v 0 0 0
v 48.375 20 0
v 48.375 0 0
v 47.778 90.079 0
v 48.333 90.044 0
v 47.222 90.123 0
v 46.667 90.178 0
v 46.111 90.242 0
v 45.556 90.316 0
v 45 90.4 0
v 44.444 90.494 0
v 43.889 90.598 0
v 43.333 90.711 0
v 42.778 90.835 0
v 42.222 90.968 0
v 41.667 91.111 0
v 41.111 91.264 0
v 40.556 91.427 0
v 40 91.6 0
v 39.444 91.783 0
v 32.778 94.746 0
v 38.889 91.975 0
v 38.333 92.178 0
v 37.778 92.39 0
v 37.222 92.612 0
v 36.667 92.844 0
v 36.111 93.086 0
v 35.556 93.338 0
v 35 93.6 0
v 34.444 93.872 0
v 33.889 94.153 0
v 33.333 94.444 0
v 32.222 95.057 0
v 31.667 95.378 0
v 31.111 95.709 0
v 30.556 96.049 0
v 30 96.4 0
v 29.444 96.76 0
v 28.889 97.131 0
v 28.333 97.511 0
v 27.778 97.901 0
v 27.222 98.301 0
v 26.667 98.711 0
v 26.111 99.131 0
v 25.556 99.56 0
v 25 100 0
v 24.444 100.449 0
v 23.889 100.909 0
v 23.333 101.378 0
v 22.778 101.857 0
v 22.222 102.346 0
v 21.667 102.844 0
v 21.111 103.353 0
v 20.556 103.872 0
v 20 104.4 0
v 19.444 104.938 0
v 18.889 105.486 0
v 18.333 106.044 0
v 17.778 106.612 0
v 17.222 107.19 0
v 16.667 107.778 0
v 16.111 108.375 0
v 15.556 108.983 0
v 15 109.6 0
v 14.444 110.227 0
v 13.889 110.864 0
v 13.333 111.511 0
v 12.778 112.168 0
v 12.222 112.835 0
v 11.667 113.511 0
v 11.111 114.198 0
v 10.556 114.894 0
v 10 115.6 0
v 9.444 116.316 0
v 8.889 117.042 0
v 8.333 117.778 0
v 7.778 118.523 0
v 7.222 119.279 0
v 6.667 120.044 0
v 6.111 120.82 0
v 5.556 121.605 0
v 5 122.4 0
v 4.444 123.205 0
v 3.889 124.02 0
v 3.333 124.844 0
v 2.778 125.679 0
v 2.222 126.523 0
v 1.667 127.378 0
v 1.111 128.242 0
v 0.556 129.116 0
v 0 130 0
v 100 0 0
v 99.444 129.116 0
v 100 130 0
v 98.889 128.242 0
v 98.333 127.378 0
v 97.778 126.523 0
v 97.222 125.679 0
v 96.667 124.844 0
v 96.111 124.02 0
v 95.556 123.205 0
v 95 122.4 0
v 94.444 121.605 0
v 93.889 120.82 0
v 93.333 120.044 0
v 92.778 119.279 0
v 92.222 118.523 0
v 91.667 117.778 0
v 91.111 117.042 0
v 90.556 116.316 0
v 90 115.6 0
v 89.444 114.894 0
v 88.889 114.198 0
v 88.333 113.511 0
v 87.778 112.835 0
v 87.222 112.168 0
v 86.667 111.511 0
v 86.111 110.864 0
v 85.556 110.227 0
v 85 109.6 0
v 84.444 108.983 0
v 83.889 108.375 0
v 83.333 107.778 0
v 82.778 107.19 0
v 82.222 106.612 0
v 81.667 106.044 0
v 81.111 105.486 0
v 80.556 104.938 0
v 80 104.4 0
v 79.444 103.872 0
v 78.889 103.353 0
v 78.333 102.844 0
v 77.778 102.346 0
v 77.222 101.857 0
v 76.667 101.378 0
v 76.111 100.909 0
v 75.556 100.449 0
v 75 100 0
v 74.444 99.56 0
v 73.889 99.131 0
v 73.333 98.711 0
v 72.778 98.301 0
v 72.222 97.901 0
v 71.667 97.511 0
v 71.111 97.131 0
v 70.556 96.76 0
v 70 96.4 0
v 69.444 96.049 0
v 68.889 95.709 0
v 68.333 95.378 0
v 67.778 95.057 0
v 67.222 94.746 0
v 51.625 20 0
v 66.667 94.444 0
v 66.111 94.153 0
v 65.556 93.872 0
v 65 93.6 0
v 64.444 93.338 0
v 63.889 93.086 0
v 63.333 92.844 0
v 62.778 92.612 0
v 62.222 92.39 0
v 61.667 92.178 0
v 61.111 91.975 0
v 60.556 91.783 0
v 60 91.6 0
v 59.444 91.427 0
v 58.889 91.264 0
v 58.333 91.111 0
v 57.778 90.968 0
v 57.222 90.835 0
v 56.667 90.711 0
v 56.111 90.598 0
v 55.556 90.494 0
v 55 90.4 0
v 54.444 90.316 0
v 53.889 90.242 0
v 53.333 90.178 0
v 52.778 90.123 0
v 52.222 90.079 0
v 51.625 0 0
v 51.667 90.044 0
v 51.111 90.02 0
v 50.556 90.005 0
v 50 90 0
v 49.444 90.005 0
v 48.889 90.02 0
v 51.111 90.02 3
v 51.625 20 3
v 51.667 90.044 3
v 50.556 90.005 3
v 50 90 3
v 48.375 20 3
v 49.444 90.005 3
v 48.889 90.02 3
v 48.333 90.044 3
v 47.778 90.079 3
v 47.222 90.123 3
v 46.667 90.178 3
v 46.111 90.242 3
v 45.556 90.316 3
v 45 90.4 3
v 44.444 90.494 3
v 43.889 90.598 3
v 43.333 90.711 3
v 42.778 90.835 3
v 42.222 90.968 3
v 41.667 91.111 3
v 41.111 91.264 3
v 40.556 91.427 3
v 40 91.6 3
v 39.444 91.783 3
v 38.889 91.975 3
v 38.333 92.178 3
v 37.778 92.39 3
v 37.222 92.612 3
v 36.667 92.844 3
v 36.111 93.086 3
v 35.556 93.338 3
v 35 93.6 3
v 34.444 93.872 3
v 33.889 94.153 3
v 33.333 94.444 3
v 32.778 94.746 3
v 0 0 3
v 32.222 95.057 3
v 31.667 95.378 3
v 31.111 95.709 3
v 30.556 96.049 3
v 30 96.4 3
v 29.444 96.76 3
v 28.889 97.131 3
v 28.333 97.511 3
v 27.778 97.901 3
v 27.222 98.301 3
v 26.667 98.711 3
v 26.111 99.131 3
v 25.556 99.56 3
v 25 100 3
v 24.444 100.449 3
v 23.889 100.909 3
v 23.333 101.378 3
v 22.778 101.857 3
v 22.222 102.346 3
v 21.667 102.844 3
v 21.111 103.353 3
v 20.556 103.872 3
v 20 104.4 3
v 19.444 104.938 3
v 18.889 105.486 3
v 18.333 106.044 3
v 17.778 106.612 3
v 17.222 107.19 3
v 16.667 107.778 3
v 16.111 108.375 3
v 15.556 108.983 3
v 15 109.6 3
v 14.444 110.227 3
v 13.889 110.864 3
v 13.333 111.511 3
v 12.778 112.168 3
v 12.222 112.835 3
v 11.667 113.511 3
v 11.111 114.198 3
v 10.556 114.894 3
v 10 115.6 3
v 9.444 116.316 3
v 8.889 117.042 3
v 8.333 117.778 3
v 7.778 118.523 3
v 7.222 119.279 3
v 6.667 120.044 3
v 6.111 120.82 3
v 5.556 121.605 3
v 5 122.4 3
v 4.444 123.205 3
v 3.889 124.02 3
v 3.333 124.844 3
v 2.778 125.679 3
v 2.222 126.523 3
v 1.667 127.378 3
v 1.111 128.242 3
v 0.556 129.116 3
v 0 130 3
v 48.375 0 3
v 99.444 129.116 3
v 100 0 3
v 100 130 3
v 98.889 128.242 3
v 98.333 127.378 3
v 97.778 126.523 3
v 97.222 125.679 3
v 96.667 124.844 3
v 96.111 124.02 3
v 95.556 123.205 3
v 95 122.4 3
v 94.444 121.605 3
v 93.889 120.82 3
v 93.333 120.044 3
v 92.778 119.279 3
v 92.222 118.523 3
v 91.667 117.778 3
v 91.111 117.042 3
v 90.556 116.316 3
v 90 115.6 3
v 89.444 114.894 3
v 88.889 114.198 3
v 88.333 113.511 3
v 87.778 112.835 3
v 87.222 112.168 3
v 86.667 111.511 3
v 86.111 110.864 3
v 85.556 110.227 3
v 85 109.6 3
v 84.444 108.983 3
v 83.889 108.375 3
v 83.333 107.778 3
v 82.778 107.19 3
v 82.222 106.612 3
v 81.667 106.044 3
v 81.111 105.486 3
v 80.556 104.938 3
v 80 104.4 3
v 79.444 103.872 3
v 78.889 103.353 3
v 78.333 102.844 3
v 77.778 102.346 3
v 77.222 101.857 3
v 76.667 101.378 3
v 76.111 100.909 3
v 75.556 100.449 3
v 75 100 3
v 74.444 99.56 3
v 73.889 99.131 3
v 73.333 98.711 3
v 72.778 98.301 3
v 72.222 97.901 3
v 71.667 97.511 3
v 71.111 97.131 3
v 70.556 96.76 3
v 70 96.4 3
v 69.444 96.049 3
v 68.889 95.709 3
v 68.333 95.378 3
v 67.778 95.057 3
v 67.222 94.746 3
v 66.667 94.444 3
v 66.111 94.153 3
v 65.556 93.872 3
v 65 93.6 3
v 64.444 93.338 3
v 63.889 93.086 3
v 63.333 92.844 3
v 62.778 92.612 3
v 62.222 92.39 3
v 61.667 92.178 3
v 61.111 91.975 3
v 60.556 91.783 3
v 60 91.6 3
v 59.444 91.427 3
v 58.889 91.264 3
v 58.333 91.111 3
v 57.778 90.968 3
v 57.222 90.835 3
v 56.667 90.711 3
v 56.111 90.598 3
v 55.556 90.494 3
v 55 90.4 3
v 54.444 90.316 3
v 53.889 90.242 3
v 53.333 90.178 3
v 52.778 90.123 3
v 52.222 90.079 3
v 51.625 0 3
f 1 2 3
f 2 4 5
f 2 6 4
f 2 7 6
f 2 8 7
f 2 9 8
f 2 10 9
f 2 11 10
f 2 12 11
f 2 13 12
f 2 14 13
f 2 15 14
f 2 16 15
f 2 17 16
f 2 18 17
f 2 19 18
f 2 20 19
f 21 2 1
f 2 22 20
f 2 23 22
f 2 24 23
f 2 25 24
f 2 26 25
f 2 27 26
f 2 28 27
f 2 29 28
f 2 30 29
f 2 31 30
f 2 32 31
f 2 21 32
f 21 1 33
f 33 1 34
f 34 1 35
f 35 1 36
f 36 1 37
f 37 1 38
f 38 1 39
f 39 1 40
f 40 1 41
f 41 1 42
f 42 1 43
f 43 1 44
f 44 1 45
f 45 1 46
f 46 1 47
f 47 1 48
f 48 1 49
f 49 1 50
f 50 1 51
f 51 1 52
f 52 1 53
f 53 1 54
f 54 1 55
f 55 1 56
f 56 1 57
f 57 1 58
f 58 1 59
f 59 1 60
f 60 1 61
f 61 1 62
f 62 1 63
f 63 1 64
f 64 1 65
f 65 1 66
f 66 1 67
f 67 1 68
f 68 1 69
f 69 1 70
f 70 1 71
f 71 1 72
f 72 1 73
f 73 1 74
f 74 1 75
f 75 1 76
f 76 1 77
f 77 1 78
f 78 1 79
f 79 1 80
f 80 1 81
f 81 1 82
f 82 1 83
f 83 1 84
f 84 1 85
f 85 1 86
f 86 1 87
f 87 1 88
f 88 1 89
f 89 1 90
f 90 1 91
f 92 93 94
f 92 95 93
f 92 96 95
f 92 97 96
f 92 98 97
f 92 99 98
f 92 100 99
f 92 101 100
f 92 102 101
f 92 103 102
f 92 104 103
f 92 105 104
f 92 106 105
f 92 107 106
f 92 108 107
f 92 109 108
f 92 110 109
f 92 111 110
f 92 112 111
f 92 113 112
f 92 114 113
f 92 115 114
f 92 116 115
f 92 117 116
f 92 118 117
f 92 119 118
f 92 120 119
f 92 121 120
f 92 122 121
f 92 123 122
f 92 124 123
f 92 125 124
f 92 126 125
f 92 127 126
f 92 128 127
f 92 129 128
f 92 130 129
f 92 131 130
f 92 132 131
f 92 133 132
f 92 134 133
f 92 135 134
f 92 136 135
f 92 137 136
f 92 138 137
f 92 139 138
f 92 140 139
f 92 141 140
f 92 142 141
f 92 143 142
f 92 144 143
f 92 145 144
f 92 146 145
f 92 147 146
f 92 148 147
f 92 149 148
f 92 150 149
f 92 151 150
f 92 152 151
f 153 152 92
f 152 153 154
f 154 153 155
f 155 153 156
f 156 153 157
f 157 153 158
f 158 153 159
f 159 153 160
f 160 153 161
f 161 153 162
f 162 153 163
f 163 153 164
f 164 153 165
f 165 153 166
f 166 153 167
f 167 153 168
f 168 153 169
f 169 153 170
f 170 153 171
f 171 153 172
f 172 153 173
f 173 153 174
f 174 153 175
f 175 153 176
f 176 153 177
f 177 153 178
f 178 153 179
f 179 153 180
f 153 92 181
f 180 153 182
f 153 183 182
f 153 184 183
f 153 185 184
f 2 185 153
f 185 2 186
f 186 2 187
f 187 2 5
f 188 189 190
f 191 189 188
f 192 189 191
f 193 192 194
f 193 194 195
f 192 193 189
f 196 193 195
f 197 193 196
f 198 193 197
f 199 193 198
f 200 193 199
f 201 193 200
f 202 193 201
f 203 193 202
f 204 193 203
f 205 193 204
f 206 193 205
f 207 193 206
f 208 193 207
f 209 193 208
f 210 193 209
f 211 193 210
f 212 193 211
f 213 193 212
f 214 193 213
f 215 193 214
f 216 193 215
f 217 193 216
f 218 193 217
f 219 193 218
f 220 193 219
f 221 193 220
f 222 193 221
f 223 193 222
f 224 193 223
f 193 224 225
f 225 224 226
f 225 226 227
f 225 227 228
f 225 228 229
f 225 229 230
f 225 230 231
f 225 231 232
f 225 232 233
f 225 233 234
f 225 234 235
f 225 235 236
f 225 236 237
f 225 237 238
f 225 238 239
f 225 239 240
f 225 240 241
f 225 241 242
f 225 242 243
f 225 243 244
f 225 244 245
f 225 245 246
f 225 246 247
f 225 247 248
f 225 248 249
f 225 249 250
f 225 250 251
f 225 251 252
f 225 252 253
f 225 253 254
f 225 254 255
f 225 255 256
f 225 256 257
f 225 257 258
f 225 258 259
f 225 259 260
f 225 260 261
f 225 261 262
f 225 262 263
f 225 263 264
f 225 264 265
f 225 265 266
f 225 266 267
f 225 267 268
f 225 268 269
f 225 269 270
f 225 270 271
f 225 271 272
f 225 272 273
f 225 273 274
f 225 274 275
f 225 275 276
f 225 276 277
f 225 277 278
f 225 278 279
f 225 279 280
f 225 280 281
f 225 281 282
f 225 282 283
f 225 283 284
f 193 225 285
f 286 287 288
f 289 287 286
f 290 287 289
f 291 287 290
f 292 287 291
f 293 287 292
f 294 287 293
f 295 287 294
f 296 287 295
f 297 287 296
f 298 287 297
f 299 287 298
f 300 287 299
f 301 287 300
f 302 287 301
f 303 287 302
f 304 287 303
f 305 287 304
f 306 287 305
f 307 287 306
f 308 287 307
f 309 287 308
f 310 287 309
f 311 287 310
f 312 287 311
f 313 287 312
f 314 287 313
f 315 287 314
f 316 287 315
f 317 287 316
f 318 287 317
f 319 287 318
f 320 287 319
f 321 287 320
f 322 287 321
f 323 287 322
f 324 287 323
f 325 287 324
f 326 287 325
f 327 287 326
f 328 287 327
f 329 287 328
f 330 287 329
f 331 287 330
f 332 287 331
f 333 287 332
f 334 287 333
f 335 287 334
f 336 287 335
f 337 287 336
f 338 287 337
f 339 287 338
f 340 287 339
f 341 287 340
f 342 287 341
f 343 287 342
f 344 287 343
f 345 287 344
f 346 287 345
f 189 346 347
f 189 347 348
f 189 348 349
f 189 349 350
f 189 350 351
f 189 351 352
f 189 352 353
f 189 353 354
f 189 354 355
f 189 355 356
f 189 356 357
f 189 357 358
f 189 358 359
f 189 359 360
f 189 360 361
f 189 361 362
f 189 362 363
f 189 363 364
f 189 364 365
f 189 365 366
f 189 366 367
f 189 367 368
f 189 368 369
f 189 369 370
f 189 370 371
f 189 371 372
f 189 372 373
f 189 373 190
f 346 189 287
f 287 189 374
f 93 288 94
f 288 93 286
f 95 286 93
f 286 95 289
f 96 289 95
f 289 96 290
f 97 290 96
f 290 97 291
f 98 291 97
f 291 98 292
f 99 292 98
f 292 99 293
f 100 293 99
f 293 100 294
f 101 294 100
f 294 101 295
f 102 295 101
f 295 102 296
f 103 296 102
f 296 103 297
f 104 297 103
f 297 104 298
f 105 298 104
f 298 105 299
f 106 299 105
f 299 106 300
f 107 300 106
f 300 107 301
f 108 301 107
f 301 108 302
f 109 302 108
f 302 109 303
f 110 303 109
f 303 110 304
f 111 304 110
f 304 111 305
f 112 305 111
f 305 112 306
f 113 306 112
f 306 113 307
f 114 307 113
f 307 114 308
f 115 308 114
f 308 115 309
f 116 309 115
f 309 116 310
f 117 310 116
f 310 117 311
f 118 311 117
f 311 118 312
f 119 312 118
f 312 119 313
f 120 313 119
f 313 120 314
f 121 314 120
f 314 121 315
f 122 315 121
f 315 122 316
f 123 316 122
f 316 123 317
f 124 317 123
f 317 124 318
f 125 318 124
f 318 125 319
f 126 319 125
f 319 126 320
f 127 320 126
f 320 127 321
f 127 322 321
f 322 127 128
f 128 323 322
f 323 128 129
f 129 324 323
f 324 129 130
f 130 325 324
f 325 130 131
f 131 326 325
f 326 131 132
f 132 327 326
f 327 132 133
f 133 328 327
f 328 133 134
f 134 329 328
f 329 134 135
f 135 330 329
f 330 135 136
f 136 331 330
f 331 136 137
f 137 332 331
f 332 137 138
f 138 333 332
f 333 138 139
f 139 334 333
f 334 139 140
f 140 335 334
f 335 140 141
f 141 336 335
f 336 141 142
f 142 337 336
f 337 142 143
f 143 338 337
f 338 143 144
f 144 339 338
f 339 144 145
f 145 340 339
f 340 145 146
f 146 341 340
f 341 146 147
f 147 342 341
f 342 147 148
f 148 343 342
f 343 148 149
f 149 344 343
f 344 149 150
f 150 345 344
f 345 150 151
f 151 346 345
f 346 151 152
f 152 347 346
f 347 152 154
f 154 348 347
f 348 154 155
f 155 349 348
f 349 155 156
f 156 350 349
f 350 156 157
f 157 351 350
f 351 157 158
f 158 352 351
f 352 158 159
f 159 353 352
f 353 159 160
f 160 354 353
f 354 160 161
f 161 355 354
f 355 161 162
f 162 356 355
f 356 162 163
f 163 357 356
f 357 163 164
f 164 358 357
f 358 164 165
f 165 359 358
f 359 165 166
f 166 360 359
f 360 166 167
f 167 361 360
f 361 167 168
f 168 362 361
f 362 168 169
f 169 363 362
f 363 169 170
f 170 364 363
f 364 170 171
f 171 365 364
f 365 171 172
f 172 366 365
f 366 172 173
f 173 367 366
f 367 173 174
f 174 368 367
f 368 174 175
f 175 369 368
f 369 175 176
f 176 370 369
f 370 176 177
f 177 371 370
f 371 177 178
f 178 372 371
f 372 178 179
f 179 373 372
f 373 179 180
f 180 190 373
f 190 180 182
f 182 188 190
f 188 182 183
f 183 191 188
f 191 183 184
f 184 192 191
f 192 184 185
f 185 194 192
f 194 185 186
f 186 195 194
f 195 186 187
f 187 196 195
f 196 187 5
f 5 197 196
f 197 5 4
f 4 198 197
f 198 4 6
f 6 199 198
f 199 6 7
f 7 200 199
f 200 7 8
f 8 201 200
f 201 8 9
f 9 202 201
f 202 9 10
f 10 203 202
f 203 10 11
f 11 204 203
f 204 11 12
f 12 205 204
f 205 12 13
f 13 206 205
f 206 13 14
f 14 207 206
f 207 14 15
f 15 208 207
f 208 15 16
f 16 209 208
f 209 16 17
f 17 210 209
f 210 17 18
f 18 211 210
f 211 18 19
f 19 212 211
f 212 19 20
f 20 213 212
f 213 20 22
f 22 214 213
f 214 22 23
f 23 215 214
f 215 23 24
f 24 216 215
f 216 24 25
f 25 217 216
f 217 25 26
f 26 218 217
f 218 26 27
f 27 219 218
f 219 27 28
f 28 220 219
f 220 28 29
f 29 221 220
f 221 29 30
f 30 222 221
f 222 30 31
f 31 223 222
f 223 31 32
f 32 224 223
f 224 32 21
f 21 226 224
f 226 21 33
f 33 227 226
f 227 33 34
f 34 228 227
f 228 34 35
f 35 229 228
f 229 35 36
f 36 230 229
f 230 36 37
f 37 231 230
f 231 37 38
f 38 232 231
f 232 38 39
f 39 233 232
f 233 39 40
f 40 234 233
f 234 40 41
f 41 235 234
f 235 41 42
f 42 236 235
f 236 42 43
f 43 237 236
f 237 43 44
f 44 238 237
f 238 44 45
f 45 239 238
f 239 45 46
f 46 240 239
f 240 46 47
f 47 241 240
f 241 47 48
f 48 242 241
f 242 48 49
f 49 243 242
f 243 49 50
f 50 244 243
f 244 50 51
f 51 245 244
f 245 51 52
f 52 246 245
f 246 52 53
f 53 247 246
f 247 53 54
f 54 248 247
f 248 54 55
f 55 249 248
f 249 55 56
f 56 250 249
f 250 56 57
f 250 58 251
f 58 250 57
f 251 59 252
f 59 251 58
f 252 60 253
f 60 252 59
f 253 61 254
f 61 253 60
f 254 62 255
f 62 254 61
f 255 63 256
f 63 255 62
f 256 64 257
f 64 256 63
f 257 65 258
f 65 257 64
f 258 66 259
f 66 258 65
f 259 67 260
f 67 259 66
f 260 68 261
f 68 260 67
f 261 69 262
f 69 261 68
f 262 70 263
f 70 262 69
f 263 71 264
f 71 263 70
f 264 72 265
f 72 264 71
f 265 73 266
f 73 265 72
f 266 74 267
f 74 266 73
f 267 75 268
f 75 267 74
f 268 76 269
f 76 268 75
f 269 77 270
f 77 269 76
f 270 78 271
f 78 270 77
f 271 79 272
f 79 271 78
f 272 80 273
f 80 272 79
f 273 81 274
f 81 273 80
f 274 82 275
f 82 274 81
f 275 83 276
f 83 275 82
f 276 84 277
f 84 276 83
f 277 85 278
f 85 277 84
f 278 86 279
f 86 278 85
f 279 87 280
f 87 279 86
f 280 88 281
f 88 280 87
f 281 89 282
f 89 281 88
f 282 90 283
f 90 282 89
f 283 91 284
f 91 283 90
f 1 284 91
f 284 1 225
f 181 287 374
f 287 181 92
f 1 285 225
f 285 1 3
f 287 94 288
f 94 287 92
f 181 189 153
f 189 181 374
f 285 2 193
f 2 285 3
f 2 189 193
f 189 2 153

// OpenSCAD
///////////////////////////////////////////////////////////////
// TRACE SLICES + STAND (single-file workflow)
// Updated per request:
//  - Slice has TWO bottom slots at 1/4 and 3/4 along length
//  - Slice and stand have SAME thickness = slice_thickness
//  - Slot opening width (mating) = slice_thickness + clearance
///////////////////////////////////////////////////////////////

//////////////////// USER PARAMETERS //////////////////////////

///////////////////////////////////////////////////////////////
MODE = "slice";          // "slice" | "stand"

//////
// Function definition and parameters
//////
function f(x,y) = x*x - y*y+5;
// Domain: [xmin,xmin+x_span] x [ymin,ymin+y_span]
xmin       = -2;         // math x-min
ymin       = -2;         // math y-min
x_span     = 4;          // math width in x-direction
y_span     = 4;          // math width in y-direction
n_samples  = 180;        // curve sampling resolution

//////
// Slice parameters
//////
slice_axis = "y";        // "x" => x=constant slices
                         // "y" => y=constant slices
numslices  = 7;          // number of traces
k          = 4;          // slice number to generate: 1...numslices
slice_thickness = 3.0;   // mm 
clearance       = 0.25;  // mm — fit tolerance

//////
// Size parameters
//////
// Physical size of the final object
x_length   = 100;        // mm
y_length   = 100;        // mm

// Vertical scaling/offset: z_mm = z_offset + z_scale * f(x,y)
z_scale    = 10;         // mm per math-unit
z_offset   = 40;         // mm
z_floor    = 0;          // mm (clamp below)

//////
// Slot parameters
//////
// Slots are located as described. For instance, slot_positions = [0.25, 0.75] would yield slots at 1/4 and 3/4 of the slice length.
slot_h     = 20;          // mm — height of the slice notch
slot_positions = [0.5];

// Slot opening (in the mating direction) = slice thickness + clearance
slot_opening_w = slice_thickness + clearance;

//////
// Stand parameters
//////
// Height is 2*slot_h; slots cut down from the top by slot_h.
stand_height  = 2*slot_h;
stand_margin  = 6;                 // mm extra length beyond the slice length on both ends
stand_N       = numslices;         // positions


///////////////////////////////////////////////////////////////
// Helpers
function lerp(a,b,t) = a + (b-a)*t;
function clamp(v, lo, hi) = (v<lo)?lo : (v>hi)?hi : v;

// Length of the generated slice in mm (depends on which axis varies).
function slice_length_mm() = (slice_axis=="x") ? y_length : x_length;

// Map y_mm in [0,y_length] to y_math in [ymin, ymin+y_span]
function y_math_from_mm(y_mm) = lerp(ymin, ymin + y_span, y_mm/y_length);

// Map x_mm in [0,x_length] to x_math in [xmin, xmin+x_span]
function x_math_from_mm(x_mm) = lerp(xmin, xmin + x_span, x_mm/x_length);

// Evenly spaced x_k in [xmin, xmin+x_span]
function xk_from_k(k_) =
    (numslices<=1) ? xmin :
    lerp(xmin, xmin + x_span, (k_-1)/(numslices-1));

// Evenly spaced y_k in [ymin, ymin+y_span]
function yk_from_k(k_) =
    (numslices<=1) ? ymin :
    lerp(ymin, ymin + y_span, (k_-1)/(numslices-1));

// Convert f(x,y) to printable z(mm), clamped
function z_mm(xm, ym) = max(z_floor, z_offset + z_scale * f(xm, ym));

// Backwards-compatible list reverse (also fine on new versions)
function reverse_list(v) = [ for (i = [len(v)-1 : -1 : 0]) v[i] ];

///////////////////////////////////////////////////////////////
// Slice: 2D outline in (Y,Z), extruded in X by slice_thickness
module slice2D_outline(k_=k) {
    xk = xk_from_k(k_);
    yk = yk_from_k(k_);
    slice_len = slice_length_mm();

    top = [
        for (i=[0:n_samples])
            let(s_mm = slice_len * i / n_samples,
                xm   = x_math_from_mm(s_mm),
                ym   = y_math_from_mm(s_mm),
                z    = (slice_axis=="x") ? z_mm(xk, ym) : z_mm(xm, yk))
            [s_mm, z]
    ];

    bottom_left  = [0, 0];
    bottom_right = [slice_len, 0];

    polygon(points = concat([bottom_left, bottom_right], reverse_list(top)));
}

module slice3D(k_=k) {
    // Some parameter combos clamp the profile to z_floor before reaching the slice end.
    // If we place a slot beyond the last nonzero profile point, it won't appear.
    // So compute an effective length for slot placement based on the sampled curve.
    xk = xk_from_k(k_);
    yk = yk_from_k(k_);
    slice_len = slice_length_mm();
    eps = 0.001;
    nonzero_idx = [
        for (i=[0:n_samples])
            let(s_mm = slice_len * i / n_samples,
                xm   = x_math_from_mm(s_mm),
                ym   = y_math_from_mm(s_mm),
                z    = (slice_axis=="x") ? z_mm(xk, ym) : z_mm(xm, yk))
            if (z > z_floor + eps) i
    ];
    slot_ref_len = (len(nonzero_idx) == 0) ? slice_len : (slice_len * max(nonzero_idx) / n_samples);

    difference() {
        linear_extrude(height = slice_thickness, center=false, convexity=10)
            slice2D_outline(k_);

        // Two bottom slots (notches): opening width = slot_opening_w,
        // height = slot_h, centered at 1/4 and 3/4 of the length.
        for (p = slot_positions) {
            // In this model, the slice outline is in the XY plane:
            //   X = along the slice length (0..slice_len)
            //   Y = vertical height (0..z)
            // and the slice thickness is extruded along Z.
            // So the notch should be positioned along X, rise in Y, and cut through Z.
            translate([ p*slot_ref_len - slot_opening_w/2, -1, -1 ]) // -1 ensures full cut
                cube([ slot_opening_w, slot_h + 1, slice_thickness + 2 ], center=false);
        }
    }
}

///////////////////////////////////////////////////////////////
// Stand: same thickness as slice (slice_thickness)
// Stand is a solid block with slots removed (i.e., the inverse of the old key comb).
module stand3D() {
    stand_len = slice_length_mm() + 2*stand_margin;

    // Position centers along Y
    function posY(i) =
        (stand_N<=1) ? (stand_len/2) :
        stand_margin + (stand_len - 2*stand_margin) * (i/(stand_N-1));

    module stand_upright() {
        // Shift so the central usable span corresponds to y in [0, slice_length_mm()].
        translate([0, -stand_margin, 0])
            difference() {
                // Base block spans y in [-stand_margin, slice_length_mm()+stand_margin].
                cube([ slice_thickness, stand_len, stand_height ], center=false);

                // Slots: cut down from the top by slot_h.
                // Slot opening (mating) = slot_opening_w.
                for (i=[0:stand_N-1]) {
                    yc = posY(i);
                    translate([-1, yc - slot_opening_w/2, stand_height - slot_h])
                        cube([ slice_thickness + 2, slot_opening_w, slot_h + 1 ], center=false);
                }
            }
    }

    // Print-friendly orientation:
    // - Flat on XY plane with thickness in +Z (0..slice_thickness)
    // - Sits on x-axis (y=0..stand_height)
    // - Long axis along +X (x=0..slice_length_mm()+2*stand_margin)
    translate([stand_margin, 0, 0])
        rotate([-90, 0, 0])
            rotate([0, 0, -90])
                stand_upright();
}

///////////////////////////////////////////////////////////////
// Build / preview
if (MODE=="slice") {
    slice3D(k);
} else if (MODE=="stand") {
    stand3D();
} else {
    echo("Unknown MODE. Use: slice | stand");
}
